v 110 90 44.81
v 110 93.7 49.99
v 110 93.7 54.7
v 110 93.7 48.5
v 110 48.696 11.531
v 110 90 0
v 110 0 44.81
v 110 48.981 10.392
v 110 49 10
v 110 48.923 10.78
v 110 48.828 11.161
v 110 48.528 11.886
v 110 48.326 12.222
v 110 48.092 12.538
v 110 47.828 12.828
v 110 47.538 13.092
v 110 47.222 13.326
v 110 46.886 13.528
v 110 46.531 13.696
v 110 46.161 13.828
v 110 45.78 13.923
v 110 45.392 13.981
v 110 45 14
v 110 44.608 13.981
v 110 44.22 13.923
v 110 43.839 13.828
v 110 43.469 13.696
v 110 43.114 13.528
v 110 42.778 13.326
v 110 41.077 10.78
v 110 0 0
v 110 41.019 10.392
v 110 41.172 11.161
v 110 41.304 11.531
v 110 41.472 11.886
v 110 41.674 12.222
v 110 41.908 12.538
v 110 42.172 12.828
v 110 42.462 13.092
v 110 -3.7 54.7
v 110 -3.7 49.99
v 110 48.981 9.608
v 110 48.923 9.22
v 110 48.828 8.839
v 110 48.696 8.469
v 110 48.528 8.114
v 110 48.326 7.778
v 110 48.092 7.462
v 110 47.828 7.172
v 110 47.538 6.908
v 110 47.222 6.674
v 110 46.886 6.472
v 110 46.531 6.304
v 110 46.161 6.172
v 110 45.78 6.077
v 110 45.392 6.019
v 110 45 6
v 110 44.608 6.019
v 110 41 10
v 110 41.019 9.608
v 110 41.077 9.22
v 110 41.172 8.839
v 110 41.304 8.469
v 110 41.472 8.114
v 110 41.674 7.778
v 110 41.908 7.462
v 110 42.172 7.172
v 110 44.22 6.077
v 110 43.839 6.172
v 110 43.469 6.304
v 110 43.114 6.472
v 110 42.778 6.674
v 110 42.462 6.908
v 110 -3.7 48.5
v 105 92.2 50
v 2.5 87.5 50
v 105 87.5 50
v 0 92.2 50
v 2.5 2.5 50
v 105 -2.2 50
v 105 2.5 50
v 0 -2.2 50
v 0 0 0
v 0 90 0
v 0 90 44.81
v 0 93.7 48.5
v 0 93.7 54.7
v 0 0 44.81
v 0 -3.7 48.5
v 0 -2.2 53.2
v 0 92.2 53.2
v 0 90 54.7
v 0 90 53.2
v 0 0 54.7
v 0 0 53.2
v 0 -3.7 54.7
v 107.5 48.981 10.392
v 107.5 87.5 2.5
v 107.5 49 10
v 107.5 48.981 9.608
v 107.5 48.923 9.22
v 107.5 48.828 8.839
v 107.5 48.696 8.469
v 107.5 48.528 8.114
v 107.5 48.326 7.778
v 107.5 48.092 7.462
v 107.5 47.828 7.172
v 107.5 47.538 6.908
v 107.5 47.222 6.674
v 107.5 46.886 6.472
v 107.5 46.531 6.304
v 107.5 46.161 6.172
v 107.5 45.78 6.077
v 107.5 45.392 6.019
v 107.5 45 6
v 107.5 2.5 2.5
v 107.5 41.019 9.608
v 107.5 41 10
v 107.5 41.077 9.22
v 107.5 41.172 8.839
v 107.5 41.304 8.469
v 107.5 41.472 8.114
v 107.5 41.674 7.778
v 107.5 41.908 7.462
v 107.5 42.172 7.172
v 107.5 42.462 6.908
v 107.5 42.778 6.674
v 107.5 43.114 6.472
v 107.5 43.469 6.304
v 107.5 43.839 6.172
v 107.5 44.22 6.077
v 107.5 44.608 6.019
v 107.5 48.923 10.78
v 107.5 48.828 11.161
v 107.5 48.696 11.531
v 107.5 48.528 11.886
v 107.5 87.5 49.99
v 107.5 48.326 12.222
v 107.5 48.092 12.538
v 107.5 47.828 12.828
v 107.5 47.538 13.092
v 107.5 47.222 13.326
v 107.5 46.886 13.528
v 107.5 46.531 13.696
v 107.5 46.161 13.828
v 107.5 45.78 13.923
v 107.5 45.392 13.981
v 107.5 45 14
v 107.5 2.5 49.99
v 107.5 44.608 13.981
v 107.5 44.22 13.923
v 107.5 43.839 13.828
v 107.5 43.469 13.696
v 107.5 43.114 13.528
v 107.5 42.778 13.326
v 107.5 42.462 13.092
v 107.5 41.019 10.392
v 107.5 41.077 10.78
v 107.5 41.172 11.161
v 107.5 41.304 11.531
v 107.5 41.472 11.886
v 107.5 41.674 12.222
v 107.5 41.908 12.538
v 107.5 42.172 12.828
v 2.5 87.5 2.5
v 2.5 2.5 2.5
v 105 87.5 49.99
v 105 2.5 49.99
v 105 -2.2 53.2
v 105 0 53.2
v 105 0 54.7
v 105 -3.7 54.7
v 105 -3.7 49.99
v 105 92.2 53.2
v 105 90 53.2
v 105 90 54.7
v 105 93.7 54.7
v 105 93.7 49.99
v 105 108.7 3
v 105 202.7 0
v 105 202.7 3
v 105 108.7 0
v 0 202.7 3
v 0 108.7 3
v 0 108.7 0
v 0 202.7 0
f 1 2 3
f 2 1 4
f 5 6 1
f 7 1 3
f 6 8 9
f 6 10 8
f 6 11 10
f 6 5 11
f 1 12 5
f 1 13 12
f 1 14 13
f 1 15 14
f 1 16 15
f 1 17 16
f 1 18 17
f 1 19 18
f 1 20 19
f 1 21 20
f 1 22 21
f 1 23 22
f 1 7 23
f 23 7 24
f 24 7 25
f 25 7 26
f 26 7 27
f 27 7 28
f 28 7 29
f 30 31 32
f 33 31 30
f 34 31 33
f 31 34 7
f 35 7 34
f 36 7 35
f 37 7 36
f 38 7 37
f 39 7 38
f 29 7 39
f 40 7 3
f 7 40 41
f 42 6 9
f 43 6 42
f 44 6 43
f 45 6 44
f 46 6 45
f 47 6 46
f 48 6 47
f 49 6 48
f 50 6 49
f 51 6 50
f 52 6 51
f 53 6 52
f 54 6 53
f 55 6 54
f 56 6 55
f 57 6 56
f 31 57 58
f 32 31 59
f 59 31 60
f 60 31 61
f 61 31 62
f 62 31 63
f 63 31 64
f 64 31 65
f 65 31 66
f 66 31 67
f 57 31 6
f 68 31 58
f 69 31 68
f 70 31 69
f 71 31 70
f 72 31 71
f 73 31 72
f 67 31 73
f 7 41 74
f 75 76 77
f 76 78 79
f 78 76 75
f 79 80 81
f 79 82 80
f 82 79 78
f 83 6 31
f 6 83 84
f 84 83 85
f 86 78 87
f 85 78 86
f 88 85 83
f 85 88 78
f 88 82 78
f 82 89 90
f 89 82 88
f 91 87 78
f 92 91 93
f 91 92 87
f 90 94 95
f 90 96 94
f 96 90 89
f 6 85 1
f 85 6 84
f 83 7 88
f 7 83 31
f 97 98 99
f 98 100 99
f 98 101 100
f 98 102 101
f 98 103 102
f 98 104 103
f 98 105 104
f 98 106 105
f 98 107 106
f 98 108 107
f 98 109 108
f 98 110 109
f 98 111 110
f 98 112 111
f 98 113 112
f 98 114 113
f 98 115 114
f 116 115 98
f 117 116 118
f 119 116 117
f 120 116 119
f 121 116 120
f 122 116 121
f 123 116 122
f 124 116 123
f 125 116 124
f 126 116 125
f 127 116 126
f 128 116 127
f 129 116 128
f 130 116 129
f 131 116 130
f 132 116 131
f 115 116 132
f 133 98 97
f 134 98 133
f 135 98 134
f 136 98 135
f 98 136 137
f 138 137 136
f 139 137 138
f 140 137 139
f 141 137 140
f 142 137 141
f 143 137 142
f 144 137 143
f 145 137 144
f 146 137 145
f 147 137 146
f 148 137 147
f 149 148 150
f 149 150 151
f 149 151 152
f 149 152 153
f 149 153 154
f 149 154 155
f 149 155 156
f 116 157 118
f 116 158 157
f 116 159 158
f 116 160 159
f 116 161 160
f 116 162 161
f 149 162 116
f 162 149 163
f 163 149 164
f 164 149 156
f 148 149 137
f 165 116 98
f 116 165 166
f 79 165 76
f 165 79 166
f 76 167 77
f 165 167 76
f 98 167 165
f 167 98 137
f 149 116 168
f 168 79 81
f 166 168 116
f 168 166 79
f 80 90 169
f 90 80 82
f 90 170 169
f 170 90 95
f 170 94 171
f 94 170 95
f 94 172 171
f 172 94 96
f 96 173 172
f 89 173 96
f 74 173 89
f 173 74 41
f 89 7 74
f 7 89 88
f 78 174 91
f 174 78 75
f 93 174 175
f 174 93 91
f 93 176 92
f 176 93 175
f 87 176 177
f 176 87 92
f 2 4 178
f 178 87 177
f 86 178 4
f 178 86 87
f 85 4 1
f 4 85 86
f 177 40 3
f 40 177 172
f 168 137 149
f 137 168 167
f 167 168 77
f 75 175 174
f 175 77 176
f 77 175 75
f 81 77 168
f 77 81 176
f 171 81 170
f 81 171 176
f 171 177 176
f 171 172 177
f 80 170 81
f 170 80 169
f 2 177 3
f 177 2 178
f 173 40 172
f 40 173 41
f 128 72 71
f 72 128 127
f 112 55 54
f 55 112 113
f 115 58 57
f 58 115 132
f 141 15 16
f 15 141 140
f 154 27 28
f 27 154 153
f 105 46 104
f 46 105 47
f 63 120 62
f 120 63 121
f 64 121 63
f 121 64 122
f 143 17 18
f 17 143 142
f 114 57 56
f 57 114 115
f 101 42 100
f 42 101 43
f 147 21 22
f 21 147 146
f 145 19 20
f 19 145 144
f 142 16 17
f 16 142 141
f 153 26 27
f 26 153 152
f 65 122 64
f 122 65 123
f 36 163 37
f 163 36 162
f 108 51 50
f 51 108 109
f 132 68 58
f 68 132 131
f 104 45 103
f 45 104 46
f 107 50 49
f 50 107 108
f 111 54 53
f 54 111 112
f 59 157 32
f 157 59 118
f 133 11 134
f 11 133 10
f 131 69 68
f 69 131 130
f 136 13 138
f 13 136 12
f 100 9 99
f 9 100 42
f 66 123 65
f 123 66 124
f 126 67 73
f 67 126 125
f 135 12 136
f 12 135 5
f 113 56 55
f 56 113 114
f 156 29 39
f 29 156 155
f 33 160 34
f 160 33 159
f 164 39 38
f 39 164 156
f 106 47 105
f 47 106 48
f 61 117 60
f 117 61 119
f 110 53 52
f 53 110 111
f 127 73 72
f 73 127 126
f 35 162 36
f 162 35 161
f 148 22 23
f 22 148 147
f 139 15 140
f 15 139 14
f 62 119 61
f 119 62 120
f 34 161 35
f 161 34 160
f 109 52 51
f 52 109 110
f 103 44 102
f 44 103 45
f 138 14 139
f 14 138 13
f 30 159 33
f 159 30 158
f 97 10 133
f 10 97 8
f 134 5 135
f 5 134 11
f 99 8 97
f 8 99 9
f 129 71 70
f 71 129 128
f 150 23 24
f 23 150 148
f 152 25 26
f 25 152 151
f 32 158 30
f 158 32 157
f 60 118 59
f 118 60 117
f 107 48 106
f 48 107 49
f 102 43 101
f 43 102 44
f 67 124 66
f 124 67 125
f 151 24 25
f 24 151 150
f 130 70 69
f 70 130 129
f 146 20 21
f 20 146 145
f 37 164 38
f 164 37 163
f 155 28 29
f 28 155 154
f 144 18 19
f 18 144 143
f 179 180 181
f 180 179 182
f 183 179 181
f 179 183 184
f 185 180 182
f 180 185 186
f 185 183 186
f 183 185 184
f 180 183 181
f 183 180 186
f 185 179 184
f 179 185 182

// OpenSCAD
// =====================================================================
// Carcasa CowControl — base cerrada + tapa deslizante (impresión FDM)
// =====================================================================
// Dos piezas separadas, sin tornillos ni bisagras:
//   - BASE: caja abierta solo por arriba, con dos rieles por fuera de
//     los lados largos y un tope en un extremo.
//   - TAPA: placa plana que entra deslizando por los rieles desde el
//     extremo abierto hasta chocar con el tope.
// Única abertura lateral: agujero redondo para el cable del ESP32.
//
// Ejes: X = largo (110), Y = ancho (90), Z = alto (50).
// La base se imprime parada (piso contra la cama) y la tapa acostada.
// =====================================================================


// ---------------------------------------------------------------------
// PARÁMETROS
// ---------------------------------------------------------------------

// --- Qué pieza dibujar ---
pieza = "ambas";        // "ambas" = las dos lado a lado, "base" o "tapa" = una sola (para exportar cada STL por separado)
separacion = 15;        // distancia en mm entre la base y la tapa cuando se dibujan las dos

// --- Cuerpo de la base (medidas exteriores, sin contar los rieles) ---
largo_ext = 110;        // largo exterior de la caja
ancho_ext = 90;         // ancho exterior de la caja
alto_ext  = 50;         // alto exterior de la caja (hasta donde apoya la tapa)
pared     = 2.5;        // espesor de las 4 paredes laterales
piso      = 2.5;        // espesor del piso

// --- Tapa deslizante ---
tapa_espesor   = 3;     // espesor de la tapa
tapa_sobresale = 2;     // cuánto sobresale la tapa de cada pared larga (esa parte entra en el riel)
tope_largo     = 5;     // largo del tope que cierra los rieles en un extremo

// --- Rieles (perfil en L por fuera de cada pared larga) ---
juego        = 0.2;     // holgura entre tapa y riel, en alto y en profundidad
riel_pared   = 1.5;     // espesor de la pared exterior del riel
riel_labio   = 1.5;     // espesor del labio que queda arriba de la tapa y no la deja levantarse
riel_base    = 1.5;     // material macizo debajo de la ranura, en el borde exterior, antes de la rampa

// --- Agujero para el cable del ESP32 ---
cable_diametro = 8;     // diámetro del agujero
cable_altura   = 10;    // altura del CENTRO del agujero, medida desde la cara de abajo de la base

// --- Protoboards (solo para verificar que entran, no se dibujan) ---
proto_largo    = 82;    // largo de cada protoboard
proto_ancho    = 55;    // ancho de cada protoboard
proto_alto     = 8.5;   // alto de cada protoboard
proto_cantidad = 2;     // cuántas van apiladas

// --- Logo opcional sobre la tapa (ver bloque comentado en el módulo tapa) ---
logo_archivo = "logo_cowcontrol.svg"; // archivo SVG, en la misma carpeta que este .scad
logo_alto    = 1;       // cuánto sobresale el logo arriba de la tapa
logo_ancho   = 60;      // tamaño del logo a lo largo de la tapa (el otro lado se ajusta solo)

// --- Calidad y detalles de modelado ---
$fn = 64;               // cantidad de lados de los círculos (más = más redondo)
e   = 0.01;             // solape mínimo para que uniones y cortes no dejen caras coincidentes


// ---------------------------------------------------------------------
// MEDIDAS CALCULADAS (no tocar: salen de los parámetros de arriba)
// ---------------------------------------------------------------------

interior_largo = largo_ext - 2 * pared;          // 105
interior_ancho = ancho_ext - 2 * pared;          // 85
interior_alto  = alto_ext - piso;                // 47.5

tapa_ancho = ancho_ext + 2 * tapa_sobresale;     // 94
tapa_largo = largo_ext - tope_largo;             // 105

ranura_alto = tapa_espesor + juego;              // 3.2  (alto del hueco donde entra el borde de la tapa)
ranura_prof = tapa_sobresale + juego;            // 2.2  (profundidad del hueco)
riel_ancho  = ranura_prof + riel_pared;          // 3.7  (cuánto sobresale el riel de la pared)
riel_alto   = ranura_alto + riel_labio;          // 4.7  (cuánto sube el riel por encima del borde de la caja)

ancho_total = ancho_ext + 2 * riel_ancho;        // 97.4 (ancho en la zona de los rieles)
alto_total  = alto_ext + riel_alto;              // 54.7 (alto en la zona de los rieles)

proto_alto_total = proto_cantidad * proto_alto;  // 17


// ---------------------------------------------------------------------
// VERIFICACIONES (se muestran en la consola de OpenSCAD)
// ---------------------------------------------------------------------

// Si algo no entra, OpenSCAD frena y muestra el mensaje en vez de dibujar.
assert(proto_largo <= interior_largo && proto_ancho <= interior_ancho,
       "Las protoboards no entran en el piso de la caja");
assert(proto_alto_total <= interior_alto,
       "Las protoboards apiladas son más altas que el interior");
assert(cable_altura - cable_diametro / 2 >= piso,
       "El agujero del cable corta el piso de la base");

echo(str("Base exterior (cuerpo): ", largo_ext, " x ", ancho_ext, " x ", alto_ext, " mm"));
echo(str("Base con rieles: ", largo_ext, " x ", ancho_total, " x ", alto_total, " mm"));
echo(str("Interior: ", interior_largo, " x ", interior_ancho, " x ", interior_alto, " mm"));
echo(str("Tapa: ", tapa_largo, " de largo x ", tapa_ancho, " de ancho x ", tapa_espesor, " de espesor (mm)"));
echo(str("Ranura del riel: ", ranura_alto, " alto x ", ranura_prof, " profundidad (juego ", juego, " mm)"));
echo(str("Agujero cable: diámetro ", cable_diametro, ", centro a ", cable_altura,
         " mm de abajo y a ", ancho_ext / 2, " mm de cada costado"));
echo(str("Margen protoboards: ", interior_largo - proto_largo, " mm de largo, ",
         interior_ancho - proto_ancho, " mm de ancho, ",
         interior_alto - proto_alto_total, " mm libres arriba"));


// ---------------------------------------------------------------------
// MÓDULOS
// ---------------------------------------------------------------------

// Caja hueca: un bloque macizo al que se le resta el interior,
// dejando las 4 paredes y el piso. Queda abierta por arriba.
module cuerpo() {
    difference() {
        cube([largo_ext, ancho_ext, alto_ext]);
        translate([pared, pared, piso])
            cube([interior_largo, interior_ancho, interior_alto + e]);
    }
}

// Perfil del riel izquierdo, dibujado en el plano Y-Z (Y negativo = hacia afuera).
// De abajo hacia arriba: rampa a 45° pegada a la pared (para imprimir sin
// soportes), ranura donde entra el borde de la tapa, y labio arriba.
// Los puntos que tocan la pared se meten "e" adentro para que se unan bien.
module perfil_riel() {
    polygon([
        [ e,           alto_ext - riel_base - riel_ancho], // arranque de la rampa, contra la pared
        [-riel_ancho,  alto_ext - riel_base],              // fin de la rampa (45°), borde exterior
        [-riel_ancho,  alto_ext + riel_alto],              // arriba, afuera
        [ 0,           alto_ext + riel_alto],              // arriba, punta del labio
        [ 0,           alto_ext + ranura_alto],            // abajo del labio
        [-ranura_prof, alto_ext + ranura_alto],            // fondo de la ranura, arriba
        [-ranura_prof, alto_ext],                          // fondo de la ranura, abajo
        [ e,           alto_ext]                           // piso de la ranura, al ras del borde de la pared
    ]);
}

// Riel izquierdo: estira el perfil a lo largo de toda la caja (eje X).
// rotate([90, 0, 90]) lleva el plano del perfil a Y-Z y la extrusión a X.
module riel() {
    rotate([90, 0, 90])
        linear_extrude(height = largo_ext)
            perfil_riel();
}

// Tope: bloque que cierra los dos rieles en el extremo del fondo.
// La tapa entra por el otro extremo (X = 0) y frena acá.
module tope() {
    translate([largo_ext - tope_largo, -riel_ancho, alto_ext - e])
        cube([tope_largo, ancho_total, riel_alto + e]);
}

// Agujero del cable: cilindro acostado que atraviesa la pared corta
// del lado del tope, centrado en el ancho y a cable_altura del piso exterior.
module agujero_cable() {
    translate([largo_ext - pared - e, ancho_ext / 2, cable_altura])
        rotate([0, 90, 0])
            cylinder(d = cable_diametro, h = pared + 2 * e);
}

// Base completa: cuerpo + los dos rieles + tope, menos el agujero del cable.
// El riel derecho es el izquierdo reflejado sobre la pared opuesta.
module base() {
    difference() {
        union() {
            cuerpo();
            riel();
            translate([0, ancho_ext, 0])
                mirror([0, 1, 0])
                    riel();
            tope();
        }
        agujero_cable();
    }
}

// Tapa: placa plana. Apoya sobre el borde de las paredes y sus 2 mm
// sobrantes de cada lado corren dentro de las ranuras de los rieles.
module tapa() {
    cube([tapa_largo, tapa_ancho, tapa_espesor]);

    // --- Logo opcional (desactivado para la primera impresión) ---
    // Para activarlo:
    //   1. Poné el SVG (vaca con caravana RFID y arcos) en la misma carpeta que este .scad.
    //   2. Si tiene otro nombre, cambiá logo_archivo en los parámetros.
    //   3. Borrá las "//" de las 4 líneas de abajo.
    // El logo tiene que quedar a más de 2.2 mm de los bordes largos de la tapa
    // (esa franja entra en los rieles): o sea, como mucho ~85 mm de ancho.
    //
    // translate([tapa_largo / 2, tapa_ancho / 2, tapa_espesor - e])
    //     linear_extrude(height = logo_alto + e)
    //         resize([logo_ancho, 0], auto = true)
    //             import(logo_archivo, center = true);
}


// ---------------------------------------------------------------------
// DIBUJO
// ---------------------------------------------------------------------

// Con "ambas", la tapa se dibuja al lado de la base (corrida en Y) para
// ver las dos piezas. Con "base" o "tapa" se dibuja solo esa, en el origen.
if (pieza != "tapa")
    base();

if (pieza != "base")
    translate(pieza == "ambas" ? [0, ancho_ext + riel_ancho + separacion, 0] : [0, 0, 0])
        tapa();


// ---------------------------------------------------------------------
// EXPORTAR A STL
// ---------------------------------------------------------------------
// 1. Arriba, poné  pieza = "base";
// 2. F6 (Design → Render) y esperá a que termine.
// 3. Design → Export → Export as STL  →  guardalo como base.stl
// 4. Repetí con  pieza = "tapa";  →  tapa.stl
// (Con pieza = "ambas" también se puede exportar: sale un solo STL con las
//  dos piezas, ya separadas y apoyadas en la cama.)
